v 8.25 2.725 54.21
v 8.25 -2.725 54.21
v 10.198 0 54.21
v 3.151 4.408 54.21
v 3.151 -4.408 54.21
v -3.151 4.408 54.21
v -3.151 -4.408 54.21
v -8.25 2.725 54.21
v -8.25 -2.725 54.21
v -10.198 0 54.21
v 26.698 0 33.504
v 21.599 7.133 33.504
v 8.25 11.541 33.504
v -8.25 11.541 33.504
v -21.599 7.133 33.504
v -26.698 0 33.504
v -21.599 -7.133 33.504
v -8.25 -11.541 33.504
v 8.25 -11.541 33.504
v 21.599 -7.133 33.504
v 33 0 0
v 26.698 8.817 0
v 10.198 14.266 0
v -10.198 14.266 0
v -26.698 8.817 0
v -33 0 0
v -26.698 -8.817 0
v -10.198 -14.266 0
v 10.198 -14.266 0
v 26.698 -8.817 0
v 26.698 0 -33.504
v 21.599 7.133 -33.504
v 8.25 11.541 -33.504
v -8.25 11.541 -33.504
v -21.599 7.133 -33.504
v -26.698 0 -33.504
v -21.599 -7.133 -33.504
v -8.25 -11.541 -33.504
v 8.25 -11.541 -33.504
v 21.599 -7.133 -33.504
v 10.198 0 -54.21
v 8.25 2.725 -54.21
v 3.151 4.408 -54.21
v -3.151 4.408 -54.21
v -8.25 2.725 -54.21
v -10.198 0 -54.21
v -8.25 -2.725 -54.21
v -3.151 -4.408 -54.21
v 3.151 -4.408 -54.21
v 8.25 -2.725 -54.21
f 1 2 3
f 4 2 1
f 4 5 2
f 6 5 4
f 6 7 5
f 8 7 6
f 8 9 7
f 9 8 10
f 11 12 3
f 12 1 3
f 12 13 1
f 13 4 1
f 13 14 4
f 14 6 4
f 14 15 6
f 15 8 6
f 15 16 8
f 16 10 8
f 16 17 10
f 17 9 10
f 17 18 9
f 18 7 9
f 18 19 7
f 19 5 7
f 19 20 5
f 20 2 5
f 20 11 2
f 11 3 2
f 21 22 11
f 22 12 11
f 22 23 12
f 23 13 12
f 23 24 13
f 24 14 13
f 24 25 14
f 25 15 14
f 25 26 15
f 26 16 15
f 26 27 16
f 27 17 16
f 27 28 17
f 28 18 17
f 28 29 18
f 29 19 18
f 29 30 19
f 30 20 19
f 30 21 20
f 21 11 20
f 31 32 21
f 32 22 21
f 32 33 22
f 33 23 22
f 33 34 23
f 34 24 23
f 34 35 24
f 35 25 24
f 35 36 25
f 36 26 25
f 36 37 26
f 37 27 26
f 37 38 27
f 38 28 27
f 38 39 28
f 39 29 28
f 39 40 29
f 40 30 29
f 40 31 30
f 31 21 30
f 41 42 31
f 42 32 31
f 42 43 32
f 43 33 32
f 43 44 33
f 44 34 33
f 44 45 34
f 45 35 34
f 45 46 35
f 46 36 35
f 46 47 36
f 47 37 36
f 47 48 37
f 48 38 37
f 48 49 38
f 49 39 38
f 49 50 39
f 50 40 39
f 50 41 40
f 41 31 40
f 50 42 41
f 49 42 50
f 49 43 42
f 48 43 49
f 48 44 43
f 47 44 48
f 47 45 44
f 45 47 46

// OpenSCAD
// Generated by SolidPython 1.0.1 on 2020-07-29 00:46:49


scale(v = [11, 5, 19]) {
	sphere(r = 3);
}
/***********************************************
*********      SolidPython code:      **********
************************************************
 
# import packages: SolidPython
from solid import *
from solid.utils import *
from itertools import chain, combinations, permutations


class Resize:

    def __init__(self, scad_file):
        self.scad_file = scad_file
        #self.scad_file = import_scad(scad_file)
        # cone/cylinder param:
        self.r1 = 0
        self.r2 = 0
        self.h = 0
        # rectangular prism param:
        self.w = 0
        self.l = 0
        # ellipse param:
        self.r = 0

    # import OpenScad code (file name corresponds to shape)


    # classify shape + parameters
    def assign(self, param1, param2, param3):
        if self.scad_file == 'cone.scad':
            self.r1 = param1
            self.r2 = param2
            self.h = param3
        elif self.scad_file == 'cylinder.scad':
            self.r1 = param1
            self.r2 = param2
            self.h = param3
        elif self.scad_file == 'rectangularPrism.scad':
            self.h = param1
            self.l = param2
            self.w = param3
        else:
            self.r = param1
            self.h = param2

    # resize parameters
    def iterate(self):
        x = range(3, 20, 2)
        i = 1
        if self.scad_file == 'cone.scad':
            tempList = list(permutations(x, 2))
            for temp in tempList:
                param1 = temp[0]
                param2 = temp[1]
                filepath = 'produced_scad_files/' + 'cone' + str(param1) + '_' + str(param2) + '_' + '.scad'
                scad_render_to_file(cylinder(h=param1, r1=param2, r2=0), filepath)

        elif self.scad_file == 'cylinder.scad':
            tempList = list(permutations(x, 3))
            for temp in tempList:
                param1 = temp[0]
                param2 = temp[1]
                filepath = 'produced_scad_files/' + 'cylinder' + str(param1) + '_' + str(param2) + '_' + '.scad'
                scad_render_to_file(cylinder(h=param1, r1=param2, r2=param2), filepath)

        elif self.scad_file == 'rectangularPrism.scad':
            tempList = list(permutations(x, 3))
            for temp in tempList:
                param1 = temp[0]
                param2 = temp[1]
                param3 = temp[2]
                filepath = 'produced_scad_files/' + 'rectangularPrism' + str(param1) + '_' + str(param2) + '_' + str(
                    param3) + '.scad'
                scad_render_to_file(cube(size=(param1, param2, param3)), filepath)

        elif self.scad_file == 'ellipse.scad':
            tempList = list(permutations(x, 4))
            for temp in tempList:
                param1 = temp[0]
                param2 = temp[1]
                param3 = temp[2]
                param4 = temp[3]
                filepath = 'produced_scad_files/' + 'ellipse' + str(param1) + '_' + str(param2) + '_' + str(param3) + '_' + str(param4) + '.scad'
                scad_render_to_file(scale([param1, param2, param3])(sphere(r=param4)), filepath)

    def render_to_scadfile(self):
        scad_render_to_file(scad, 'example.scad') 
 
************************************************/
